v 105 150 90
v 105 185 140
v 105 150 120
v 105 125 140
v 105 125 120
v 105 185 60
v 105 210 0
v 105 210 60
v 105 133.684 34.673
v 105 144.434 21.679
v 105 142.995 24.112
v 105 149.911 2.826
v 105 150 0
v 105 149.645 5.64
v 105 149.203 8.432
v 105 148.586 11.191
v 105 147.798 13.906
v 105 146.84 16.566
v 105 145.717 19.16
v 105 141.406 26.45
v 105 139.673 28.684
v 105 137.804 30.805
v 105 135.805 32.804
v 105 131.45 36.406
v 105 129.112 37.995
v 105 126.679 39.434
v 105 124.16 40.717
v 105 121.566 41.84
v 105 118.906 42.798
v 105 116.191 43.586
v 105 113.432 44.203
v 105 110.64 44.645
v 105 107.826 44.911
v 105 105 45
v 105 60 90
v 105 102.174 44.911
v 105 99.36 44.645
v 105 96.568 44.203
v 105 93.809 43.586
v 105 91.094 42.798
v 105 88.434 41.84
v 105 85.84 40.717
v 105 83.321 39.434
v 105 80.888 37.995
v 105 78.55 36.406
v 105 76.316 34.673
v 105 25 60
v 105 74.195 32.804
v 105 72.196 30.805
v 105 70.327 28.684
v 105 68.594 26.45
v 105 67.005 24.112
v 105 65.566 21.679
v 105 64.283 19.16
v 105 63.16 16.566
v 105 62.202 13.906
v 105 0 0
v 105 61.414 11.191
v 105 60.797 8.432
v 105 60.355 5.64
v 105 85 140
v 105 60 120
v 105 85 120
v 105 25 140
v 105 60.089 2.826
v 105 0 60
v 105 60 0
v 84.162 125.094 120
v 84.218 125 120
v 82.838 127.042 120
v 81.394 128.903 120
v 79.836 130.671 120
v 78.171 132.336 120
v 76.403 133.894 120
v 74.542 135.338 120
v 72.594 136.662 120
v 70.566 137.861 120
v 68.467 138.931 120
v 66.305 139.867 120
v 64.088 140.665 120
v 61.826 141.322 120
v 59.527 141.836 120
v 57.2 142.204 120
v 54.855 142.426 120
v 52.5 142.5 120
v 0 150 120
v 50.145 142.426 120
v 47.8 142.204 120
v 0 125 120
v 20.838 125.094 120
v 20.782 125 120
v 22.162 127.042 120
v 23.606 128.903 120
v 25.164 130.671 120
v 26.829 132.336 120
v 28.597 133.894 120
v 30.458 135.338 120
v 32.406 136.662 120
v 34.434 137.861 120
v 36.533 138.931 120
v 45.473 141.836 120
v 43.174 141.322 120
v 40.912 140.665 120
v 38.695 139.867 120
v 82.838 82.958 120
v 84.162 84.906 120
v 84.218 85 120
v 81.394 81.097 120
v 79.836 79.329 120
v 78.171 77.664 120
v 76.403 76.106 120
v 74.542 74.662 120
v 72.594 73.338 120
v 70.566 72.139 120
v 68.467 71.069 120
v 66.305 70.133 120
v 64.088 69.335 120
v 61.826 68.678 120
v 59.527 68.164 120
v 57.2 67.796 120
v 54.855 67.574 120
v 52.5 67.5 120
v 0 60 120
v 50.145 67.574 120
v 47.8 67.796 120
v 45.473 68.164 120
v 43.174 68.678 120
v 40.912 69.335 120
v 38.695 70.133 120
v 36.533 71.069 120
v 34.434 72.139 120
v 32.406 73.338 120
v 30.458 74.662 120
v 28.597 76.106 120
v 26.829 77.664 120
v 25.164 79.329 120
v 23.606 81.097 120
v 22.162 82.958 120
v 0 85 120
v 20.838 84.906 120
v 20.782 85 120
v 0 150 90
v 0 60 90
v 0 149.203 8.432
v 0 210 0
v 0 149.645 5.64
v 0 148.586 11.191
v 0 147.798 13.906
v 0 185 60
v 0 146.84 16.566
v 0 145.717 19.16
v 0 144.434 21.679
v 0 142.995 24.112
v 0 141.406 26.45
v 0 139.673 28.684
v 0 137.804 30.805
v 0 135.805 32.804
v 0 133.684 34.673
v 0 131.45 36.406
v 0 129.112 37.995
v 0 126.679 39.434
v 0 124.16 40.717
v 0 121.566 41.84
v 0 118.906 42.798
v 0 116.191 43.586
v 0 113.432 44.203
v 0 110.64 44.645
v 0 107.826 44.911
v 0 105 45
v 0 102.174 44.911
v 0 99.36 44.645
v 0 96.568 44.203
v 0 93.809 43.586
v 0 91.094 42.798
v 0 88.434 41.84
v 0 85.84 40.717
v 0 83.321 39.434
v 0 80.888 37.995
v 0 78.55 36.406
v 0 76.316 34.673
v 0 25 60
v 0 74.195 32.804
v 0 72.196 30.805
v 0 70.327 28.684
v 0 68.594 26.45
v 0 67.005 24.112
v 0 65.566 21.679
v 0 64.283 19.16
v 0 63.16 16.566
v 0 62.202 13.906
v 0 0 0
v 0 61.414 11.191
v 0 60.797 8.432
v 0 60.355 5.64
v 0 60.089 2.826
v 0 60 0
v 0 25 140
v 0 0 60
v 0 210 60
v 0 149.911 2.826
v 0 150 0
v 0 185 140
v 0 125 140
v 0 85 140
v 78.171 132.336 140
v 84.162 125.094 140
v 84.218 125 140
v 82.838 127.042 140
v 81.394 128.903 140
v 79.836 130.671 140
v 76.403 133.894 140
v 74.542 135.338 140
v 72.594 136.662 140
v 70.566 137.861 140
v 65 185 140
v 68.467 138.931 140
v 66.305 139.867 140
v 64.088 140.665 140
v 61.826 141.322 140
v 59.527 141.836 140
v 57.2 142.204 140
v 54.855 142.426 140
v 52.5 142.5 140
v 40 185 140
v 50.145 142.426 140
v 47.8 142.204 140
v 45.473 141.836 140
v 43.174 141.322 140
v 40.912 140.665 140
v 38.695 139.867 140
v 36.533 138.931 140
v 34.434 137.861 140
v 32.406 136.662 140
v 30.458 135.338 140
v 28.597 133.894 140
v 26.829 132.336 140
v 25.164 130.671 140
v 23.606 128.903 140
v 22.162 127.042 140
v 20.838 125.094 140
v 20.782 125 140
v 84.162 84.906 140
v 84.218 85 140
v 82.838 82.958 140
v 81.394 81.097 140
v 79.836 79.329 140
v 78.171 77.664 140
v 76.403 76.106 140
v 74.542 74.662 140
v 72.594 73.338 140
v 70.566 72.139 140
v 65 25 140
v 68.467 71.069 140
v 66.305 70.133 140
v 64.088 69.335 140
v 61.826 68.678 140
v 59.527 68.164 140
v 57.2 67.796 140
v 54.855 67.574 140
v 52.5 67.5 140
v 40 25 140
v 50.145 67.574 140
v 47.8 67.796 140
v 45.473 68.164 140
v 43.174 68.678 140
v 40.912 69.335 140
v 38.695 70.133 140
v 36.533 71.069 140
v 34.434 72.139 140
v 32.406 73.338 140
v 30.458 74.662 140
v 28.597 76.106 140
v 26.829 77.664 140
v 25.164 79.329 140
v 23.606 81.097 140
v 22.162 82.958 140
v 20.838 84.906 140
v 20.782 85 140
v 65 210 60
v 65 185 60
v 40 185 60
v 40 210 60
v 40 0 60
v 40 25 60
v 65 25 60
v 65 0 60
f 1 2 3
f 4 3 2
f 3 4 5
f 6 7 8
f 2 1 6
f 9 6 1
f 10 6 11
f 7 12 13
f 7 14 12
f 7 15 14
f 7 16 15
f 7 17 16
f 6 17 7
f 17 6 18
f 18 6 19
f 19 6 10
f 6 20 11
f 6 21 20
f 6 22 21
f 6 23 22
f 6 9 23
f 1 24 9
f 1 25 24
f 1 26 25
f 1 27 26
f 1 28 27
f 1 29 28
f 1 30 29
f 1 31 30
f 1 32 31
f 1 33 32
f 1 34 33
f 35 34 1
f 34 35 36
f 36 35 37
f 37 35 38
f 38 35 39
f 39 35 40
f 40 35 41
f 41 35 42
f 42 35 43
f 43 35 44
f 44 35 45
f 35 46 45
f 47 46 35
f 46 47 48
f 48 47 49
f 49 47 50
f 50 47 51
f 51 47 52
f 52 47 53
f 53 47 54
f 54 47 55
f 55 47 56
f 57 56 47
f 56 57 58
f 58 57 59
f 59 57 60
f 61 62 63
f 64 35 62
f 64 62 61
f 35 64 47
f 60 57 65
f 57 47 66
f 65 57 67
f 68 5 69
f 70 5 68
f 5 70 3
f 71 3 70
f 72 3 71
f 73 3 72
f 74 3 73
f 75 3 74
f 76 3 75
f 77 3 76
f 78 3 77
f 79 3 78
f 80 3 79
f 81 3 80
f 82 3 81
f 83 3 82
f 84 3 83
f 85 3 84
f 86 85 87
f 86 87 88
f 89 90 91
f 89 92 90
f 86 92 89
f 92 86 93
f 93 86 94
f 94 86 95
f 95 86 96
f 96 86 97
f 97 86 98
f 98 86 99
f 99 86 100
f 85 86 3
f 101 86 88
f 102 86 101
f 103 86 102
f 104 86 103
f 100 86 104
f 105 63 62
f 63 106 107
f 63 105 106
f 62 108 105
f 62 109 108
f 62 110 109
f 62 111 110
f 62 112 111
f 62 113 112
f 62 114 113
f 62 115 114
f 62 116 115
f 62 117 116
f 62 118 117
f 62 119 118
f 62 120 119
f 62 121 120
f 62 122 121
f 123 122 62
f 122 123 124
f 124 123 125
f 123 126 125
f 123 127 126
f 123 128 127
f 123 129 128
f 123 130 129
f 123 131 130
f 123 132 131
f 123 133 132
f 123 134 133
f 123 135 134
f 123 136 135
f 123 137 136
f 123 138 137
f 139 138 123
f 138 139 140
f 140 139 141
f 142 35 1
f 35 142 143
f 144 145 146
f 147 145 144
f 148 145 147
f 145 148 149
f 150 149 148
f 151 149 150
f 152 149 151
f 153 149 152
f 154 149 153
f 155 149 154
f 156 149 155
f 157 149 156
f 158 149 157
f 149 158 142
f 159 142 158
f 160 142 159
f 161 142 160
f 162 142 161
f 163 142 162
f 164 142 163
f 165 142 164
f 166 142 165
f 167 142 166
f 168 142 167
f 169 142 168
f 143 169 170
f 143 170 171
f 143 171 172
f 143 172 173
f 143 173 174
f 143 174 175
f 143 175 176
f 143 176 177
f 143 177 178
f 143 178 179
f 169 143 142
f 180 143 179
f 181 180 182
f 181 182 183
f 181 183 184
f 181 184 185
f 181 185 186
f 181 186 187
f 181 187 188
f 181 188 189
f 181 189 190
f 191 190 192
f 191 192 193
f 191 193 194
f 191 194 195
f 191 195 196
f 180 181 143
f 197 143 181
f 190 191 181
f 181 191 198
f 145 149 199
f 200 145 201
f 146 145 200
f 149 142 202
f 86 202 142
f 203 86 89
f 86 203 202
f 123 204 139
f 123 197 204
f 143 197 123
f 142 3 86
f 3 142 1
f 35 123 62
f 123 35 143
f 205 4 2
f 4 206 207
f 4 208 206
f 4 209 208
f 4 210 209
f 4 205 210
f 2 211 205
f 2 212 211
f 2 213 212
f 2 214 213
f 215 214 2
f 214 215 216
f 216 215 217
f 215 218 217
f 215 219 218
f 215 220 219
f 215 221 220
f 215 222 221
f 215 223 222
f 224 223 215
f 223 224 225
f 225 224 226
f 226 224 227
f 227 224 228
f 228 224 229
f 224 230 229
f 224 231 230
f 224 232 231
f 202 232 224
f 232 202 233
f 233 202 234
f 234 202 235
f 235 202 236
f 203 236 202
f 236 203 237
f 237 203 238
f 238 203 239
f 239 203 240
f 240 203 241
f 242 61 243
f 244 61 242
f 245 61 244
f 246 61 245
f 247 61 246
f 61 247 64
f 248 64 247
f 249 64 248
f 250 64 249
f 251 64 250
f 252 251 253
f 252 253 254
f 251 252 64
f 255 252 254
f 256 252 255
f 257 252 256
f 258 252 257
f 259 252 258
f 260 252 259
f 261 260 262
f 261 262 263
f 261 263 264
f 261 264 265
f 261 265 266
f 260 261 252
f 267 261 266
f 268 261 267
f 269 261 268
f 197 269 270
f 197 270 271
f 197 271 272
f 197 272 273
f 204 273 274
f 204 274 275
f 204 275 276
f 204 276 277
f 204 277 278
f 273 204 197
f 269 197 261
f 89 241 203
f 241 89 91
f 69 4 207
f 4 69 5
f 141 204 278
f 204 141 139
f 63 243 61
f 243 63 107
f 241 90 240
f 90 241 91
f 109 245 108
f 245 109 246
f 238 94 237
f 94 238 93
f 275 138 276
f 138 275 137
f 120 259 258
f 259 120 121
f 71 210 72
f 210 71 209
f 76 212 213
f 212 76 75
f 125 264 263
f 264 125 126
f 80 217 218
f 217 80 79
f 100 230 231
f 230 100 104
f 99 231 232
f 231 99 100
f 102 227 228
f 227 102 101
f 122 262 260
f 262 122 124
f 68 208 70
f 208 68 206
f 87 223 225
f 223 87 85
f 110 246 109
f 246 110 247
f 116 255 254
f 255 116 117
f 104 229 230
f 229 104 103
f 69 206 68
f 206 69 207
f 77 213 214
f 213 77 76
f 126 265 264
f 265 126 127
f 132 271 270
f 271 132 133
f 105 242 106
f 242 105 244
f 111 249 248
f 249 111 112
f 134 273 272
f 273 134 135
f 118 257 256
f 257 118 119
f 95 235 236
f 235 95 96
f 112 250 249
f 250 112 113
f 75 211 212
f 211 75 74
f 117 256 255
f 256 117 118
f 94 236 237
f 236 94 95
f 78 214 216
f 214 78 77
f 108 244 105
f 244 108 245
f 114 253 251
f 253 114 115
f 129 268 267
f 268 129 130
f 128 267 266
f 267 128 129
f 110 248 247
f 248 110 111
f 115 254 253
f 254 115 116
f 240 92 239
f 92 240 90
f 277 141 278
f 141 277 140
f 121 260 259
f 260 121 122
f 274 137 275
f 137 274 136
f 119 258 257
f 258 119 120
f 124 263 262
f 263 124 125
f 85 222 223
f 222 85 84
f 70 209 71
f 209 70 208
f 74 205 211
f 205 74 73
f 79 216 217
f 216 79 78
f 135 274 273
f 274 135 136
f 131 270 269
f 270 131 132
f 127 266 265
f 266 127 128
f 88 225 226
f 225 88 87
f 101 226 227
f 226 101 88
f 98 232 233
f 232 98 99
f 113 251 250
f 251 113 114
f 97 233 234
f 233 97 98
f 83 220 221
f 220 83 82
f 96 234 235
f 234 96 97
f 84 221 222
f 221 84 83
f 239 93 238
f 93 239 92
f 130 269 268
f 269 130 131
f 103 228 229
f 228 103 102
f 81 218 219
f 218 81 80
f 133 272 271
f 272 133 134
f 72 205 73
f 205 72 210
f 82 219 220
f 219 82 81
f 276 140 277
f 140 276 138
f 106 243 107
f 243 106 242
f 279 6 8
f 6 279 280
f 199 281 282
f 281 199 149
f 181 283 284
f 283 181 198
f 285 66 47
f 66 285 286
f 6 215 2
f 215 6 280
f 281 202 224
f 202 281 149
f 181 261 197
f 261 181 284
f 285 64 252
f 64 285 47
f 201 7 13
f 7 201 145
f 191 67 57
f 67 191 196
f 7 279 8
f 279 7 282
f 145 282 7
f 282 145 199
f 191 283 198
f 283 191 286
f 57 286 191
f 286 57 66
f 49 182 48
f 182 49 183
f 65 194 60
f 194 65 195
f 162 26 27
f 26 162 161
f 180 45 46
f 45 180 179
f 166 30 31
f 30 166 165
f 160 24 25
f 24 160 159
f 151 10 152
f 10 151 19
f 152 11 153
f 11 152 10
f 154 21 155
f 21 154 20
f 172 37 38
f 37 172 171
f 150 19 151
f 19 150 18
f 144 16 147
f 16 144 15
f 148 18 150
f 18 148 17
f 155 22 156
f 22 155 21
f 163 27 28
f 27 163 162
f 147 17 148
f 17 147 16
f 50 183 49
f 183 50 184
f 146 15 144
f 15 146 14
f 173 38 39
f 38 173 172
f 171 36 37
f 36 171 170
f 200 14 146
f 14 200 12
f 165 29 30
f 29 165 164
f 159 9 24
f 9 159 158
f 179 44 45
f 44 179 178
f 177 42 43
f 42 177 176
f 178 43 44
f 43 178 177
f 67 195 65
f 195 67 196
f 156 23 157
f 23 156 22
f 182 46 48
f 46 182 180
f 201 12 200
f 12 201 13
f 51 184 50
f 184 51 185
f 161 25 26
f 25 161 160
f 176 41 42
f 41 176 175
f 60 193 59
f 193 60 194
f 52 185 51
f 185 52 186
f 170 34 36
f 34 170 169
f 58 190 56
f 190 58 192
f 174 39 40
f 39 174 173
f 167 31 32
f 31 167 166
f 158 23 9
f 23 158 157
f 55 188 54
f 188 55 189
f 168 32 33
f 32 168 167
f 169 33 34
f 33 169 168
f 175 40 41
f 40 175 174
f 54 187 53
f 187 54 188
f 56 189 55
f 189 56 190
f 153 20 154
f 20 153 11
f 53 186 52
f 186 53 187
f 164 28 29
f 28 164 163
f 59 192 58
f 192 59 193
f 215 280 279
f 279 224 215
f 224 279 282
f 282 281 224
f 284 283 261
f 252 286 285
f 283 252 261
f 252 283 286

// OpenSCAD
// file: lib.scad
/*
 * Make a pair of an object.
 *
 * @param split The distance to seperate the pair.
 *
 * @param rot An optional amount to rotate the pair.
 *
 * @param edge Center on the left of the pair rather than the middle.
 *
 * @pair mirrored Make the left a mirror of the right instead of a
 *                rotation.
 */
module pair(split,rot=0,edge=false/*, mirrord=false*/){
     module center(){
	  if(edge){
	       translate([split/2,0,0]){
		    children();}}
	  else{
	       children();}}
     rotate([0,0,rot]){
	  center(){
	       translate([split/2,0,0]){
		    children();}
	       translate([-split/2,0,0]){
		    rotate([0,0,180]){
			 children();}}}}}

module xpair(split,rot=0,edge=false){
     pair(split,rot,edge){
	  children();}}
module ypair(split,rot=0,edge=false){
     rotate(90){
	  pair(split,rot,edge){
	       rotate(-90){
		    children();}}}}

/*
 * Make a pair but with a middle element.
 *
 * @param split The distance to seperate the pair.
 *
 * @param rot An optional amount to rotate the pair.
 */
module tripple(split,rot=0){
     rotate([0,0,90]){
	  children();}
     pair(split,rot){
	  children();}}
/*
 * Make a set of objects in a circle.
 *
 * @param count The number of elements in the circle
 *
 * @param r The raius of the circle.
 */
module set(count,r){
     for(i=[0:count]){
	  rotate([0,0,360/count*i]){
	       translate([r,0,0]){
		    children();}}}}

module set_better(count,radius,r,diameter,d){
     module set_impl(count,r){
	  for(i=[0:count]){
	       rotate([0,0,360/count*i]){
		    translate([r,0,0]){
			 children();}}}}
     if(!count){
	  //error
     }
     if(radius){
	  if(r || diameter || d){
	       // error
	  }else{
	       set_impl(count,radius){
		    children();}}}
     if(r){
	  if(radius || diameter || d){
	       // error
	  }else{
	       set_impl(count,r){
		    children();}}}
     if(diameter){
	  if(radius || r || d){
	       // error
	  }else{
	       set_impl(count,diameter/2){
		    children();}}}
     if(d){
	  if(radius || r || diameter){
	       // error
	  }else{
	       set_impl(count,d/2){
		    children();}}}}

/*
 * A quick rename of translate along z.
 *
 * @param distance The distance to lift by.
 */
module up(distance){
     translate([0,0,distance]){
	  children();}}

module arch(radius,height,thickness){
     cylinder(r=radius,h=thickness);
     translate([0,-radius,0]){
	  cube([height-radius,2*radius,thickness]);}}
// main file
$fn=100;
mm=1; // define units
degrees=1;

use <lib.scad>;

module example_110(){
     top_width=160*mm;
     length=105*mm;
     top_height=80*mm;
     bottom_height=60*mm;
     bottom_width=210*mm;
     module top_half(){
	  module socket(){
	       socket_height=50*mm;
	       translate([0,top_width/2,top_height-socket_height]){
		    translate([0,-90/2,0])cube([length,90,30]);
		    translate([0,-40/2,0])cube([length,40,socket_height]);
		    translate([length/2,0,0])cylinder(r=37.5,h=socket_height);}}
	  difference(){
	       cube([length,top_width,top_height]);
	       socket();
	  }
     }
     module bottom_half(){
	  difference(){
	       cube([length,bottom_width,bottom_height]);
	       translate([0,bottom_width/2,0])rotate([0,90])cylinder(r=45,h=length);
	  }
     }
     module supports(){
	  translate([length/2,bottom_width/2,bottom_height]){
	       pair(top_width,90){
		    translate([0,-25/2,0]){
			 rotate([0,-90,-90]){
			      linear_extrude(25){
				   polygon([[0,0],[top_height,0],[0,25]]);}}}}}}
     translate([0,(bottom_width-top_width)/2,bottom_height])top_half();
     bottom_half();
     supports();
}

example_110();
